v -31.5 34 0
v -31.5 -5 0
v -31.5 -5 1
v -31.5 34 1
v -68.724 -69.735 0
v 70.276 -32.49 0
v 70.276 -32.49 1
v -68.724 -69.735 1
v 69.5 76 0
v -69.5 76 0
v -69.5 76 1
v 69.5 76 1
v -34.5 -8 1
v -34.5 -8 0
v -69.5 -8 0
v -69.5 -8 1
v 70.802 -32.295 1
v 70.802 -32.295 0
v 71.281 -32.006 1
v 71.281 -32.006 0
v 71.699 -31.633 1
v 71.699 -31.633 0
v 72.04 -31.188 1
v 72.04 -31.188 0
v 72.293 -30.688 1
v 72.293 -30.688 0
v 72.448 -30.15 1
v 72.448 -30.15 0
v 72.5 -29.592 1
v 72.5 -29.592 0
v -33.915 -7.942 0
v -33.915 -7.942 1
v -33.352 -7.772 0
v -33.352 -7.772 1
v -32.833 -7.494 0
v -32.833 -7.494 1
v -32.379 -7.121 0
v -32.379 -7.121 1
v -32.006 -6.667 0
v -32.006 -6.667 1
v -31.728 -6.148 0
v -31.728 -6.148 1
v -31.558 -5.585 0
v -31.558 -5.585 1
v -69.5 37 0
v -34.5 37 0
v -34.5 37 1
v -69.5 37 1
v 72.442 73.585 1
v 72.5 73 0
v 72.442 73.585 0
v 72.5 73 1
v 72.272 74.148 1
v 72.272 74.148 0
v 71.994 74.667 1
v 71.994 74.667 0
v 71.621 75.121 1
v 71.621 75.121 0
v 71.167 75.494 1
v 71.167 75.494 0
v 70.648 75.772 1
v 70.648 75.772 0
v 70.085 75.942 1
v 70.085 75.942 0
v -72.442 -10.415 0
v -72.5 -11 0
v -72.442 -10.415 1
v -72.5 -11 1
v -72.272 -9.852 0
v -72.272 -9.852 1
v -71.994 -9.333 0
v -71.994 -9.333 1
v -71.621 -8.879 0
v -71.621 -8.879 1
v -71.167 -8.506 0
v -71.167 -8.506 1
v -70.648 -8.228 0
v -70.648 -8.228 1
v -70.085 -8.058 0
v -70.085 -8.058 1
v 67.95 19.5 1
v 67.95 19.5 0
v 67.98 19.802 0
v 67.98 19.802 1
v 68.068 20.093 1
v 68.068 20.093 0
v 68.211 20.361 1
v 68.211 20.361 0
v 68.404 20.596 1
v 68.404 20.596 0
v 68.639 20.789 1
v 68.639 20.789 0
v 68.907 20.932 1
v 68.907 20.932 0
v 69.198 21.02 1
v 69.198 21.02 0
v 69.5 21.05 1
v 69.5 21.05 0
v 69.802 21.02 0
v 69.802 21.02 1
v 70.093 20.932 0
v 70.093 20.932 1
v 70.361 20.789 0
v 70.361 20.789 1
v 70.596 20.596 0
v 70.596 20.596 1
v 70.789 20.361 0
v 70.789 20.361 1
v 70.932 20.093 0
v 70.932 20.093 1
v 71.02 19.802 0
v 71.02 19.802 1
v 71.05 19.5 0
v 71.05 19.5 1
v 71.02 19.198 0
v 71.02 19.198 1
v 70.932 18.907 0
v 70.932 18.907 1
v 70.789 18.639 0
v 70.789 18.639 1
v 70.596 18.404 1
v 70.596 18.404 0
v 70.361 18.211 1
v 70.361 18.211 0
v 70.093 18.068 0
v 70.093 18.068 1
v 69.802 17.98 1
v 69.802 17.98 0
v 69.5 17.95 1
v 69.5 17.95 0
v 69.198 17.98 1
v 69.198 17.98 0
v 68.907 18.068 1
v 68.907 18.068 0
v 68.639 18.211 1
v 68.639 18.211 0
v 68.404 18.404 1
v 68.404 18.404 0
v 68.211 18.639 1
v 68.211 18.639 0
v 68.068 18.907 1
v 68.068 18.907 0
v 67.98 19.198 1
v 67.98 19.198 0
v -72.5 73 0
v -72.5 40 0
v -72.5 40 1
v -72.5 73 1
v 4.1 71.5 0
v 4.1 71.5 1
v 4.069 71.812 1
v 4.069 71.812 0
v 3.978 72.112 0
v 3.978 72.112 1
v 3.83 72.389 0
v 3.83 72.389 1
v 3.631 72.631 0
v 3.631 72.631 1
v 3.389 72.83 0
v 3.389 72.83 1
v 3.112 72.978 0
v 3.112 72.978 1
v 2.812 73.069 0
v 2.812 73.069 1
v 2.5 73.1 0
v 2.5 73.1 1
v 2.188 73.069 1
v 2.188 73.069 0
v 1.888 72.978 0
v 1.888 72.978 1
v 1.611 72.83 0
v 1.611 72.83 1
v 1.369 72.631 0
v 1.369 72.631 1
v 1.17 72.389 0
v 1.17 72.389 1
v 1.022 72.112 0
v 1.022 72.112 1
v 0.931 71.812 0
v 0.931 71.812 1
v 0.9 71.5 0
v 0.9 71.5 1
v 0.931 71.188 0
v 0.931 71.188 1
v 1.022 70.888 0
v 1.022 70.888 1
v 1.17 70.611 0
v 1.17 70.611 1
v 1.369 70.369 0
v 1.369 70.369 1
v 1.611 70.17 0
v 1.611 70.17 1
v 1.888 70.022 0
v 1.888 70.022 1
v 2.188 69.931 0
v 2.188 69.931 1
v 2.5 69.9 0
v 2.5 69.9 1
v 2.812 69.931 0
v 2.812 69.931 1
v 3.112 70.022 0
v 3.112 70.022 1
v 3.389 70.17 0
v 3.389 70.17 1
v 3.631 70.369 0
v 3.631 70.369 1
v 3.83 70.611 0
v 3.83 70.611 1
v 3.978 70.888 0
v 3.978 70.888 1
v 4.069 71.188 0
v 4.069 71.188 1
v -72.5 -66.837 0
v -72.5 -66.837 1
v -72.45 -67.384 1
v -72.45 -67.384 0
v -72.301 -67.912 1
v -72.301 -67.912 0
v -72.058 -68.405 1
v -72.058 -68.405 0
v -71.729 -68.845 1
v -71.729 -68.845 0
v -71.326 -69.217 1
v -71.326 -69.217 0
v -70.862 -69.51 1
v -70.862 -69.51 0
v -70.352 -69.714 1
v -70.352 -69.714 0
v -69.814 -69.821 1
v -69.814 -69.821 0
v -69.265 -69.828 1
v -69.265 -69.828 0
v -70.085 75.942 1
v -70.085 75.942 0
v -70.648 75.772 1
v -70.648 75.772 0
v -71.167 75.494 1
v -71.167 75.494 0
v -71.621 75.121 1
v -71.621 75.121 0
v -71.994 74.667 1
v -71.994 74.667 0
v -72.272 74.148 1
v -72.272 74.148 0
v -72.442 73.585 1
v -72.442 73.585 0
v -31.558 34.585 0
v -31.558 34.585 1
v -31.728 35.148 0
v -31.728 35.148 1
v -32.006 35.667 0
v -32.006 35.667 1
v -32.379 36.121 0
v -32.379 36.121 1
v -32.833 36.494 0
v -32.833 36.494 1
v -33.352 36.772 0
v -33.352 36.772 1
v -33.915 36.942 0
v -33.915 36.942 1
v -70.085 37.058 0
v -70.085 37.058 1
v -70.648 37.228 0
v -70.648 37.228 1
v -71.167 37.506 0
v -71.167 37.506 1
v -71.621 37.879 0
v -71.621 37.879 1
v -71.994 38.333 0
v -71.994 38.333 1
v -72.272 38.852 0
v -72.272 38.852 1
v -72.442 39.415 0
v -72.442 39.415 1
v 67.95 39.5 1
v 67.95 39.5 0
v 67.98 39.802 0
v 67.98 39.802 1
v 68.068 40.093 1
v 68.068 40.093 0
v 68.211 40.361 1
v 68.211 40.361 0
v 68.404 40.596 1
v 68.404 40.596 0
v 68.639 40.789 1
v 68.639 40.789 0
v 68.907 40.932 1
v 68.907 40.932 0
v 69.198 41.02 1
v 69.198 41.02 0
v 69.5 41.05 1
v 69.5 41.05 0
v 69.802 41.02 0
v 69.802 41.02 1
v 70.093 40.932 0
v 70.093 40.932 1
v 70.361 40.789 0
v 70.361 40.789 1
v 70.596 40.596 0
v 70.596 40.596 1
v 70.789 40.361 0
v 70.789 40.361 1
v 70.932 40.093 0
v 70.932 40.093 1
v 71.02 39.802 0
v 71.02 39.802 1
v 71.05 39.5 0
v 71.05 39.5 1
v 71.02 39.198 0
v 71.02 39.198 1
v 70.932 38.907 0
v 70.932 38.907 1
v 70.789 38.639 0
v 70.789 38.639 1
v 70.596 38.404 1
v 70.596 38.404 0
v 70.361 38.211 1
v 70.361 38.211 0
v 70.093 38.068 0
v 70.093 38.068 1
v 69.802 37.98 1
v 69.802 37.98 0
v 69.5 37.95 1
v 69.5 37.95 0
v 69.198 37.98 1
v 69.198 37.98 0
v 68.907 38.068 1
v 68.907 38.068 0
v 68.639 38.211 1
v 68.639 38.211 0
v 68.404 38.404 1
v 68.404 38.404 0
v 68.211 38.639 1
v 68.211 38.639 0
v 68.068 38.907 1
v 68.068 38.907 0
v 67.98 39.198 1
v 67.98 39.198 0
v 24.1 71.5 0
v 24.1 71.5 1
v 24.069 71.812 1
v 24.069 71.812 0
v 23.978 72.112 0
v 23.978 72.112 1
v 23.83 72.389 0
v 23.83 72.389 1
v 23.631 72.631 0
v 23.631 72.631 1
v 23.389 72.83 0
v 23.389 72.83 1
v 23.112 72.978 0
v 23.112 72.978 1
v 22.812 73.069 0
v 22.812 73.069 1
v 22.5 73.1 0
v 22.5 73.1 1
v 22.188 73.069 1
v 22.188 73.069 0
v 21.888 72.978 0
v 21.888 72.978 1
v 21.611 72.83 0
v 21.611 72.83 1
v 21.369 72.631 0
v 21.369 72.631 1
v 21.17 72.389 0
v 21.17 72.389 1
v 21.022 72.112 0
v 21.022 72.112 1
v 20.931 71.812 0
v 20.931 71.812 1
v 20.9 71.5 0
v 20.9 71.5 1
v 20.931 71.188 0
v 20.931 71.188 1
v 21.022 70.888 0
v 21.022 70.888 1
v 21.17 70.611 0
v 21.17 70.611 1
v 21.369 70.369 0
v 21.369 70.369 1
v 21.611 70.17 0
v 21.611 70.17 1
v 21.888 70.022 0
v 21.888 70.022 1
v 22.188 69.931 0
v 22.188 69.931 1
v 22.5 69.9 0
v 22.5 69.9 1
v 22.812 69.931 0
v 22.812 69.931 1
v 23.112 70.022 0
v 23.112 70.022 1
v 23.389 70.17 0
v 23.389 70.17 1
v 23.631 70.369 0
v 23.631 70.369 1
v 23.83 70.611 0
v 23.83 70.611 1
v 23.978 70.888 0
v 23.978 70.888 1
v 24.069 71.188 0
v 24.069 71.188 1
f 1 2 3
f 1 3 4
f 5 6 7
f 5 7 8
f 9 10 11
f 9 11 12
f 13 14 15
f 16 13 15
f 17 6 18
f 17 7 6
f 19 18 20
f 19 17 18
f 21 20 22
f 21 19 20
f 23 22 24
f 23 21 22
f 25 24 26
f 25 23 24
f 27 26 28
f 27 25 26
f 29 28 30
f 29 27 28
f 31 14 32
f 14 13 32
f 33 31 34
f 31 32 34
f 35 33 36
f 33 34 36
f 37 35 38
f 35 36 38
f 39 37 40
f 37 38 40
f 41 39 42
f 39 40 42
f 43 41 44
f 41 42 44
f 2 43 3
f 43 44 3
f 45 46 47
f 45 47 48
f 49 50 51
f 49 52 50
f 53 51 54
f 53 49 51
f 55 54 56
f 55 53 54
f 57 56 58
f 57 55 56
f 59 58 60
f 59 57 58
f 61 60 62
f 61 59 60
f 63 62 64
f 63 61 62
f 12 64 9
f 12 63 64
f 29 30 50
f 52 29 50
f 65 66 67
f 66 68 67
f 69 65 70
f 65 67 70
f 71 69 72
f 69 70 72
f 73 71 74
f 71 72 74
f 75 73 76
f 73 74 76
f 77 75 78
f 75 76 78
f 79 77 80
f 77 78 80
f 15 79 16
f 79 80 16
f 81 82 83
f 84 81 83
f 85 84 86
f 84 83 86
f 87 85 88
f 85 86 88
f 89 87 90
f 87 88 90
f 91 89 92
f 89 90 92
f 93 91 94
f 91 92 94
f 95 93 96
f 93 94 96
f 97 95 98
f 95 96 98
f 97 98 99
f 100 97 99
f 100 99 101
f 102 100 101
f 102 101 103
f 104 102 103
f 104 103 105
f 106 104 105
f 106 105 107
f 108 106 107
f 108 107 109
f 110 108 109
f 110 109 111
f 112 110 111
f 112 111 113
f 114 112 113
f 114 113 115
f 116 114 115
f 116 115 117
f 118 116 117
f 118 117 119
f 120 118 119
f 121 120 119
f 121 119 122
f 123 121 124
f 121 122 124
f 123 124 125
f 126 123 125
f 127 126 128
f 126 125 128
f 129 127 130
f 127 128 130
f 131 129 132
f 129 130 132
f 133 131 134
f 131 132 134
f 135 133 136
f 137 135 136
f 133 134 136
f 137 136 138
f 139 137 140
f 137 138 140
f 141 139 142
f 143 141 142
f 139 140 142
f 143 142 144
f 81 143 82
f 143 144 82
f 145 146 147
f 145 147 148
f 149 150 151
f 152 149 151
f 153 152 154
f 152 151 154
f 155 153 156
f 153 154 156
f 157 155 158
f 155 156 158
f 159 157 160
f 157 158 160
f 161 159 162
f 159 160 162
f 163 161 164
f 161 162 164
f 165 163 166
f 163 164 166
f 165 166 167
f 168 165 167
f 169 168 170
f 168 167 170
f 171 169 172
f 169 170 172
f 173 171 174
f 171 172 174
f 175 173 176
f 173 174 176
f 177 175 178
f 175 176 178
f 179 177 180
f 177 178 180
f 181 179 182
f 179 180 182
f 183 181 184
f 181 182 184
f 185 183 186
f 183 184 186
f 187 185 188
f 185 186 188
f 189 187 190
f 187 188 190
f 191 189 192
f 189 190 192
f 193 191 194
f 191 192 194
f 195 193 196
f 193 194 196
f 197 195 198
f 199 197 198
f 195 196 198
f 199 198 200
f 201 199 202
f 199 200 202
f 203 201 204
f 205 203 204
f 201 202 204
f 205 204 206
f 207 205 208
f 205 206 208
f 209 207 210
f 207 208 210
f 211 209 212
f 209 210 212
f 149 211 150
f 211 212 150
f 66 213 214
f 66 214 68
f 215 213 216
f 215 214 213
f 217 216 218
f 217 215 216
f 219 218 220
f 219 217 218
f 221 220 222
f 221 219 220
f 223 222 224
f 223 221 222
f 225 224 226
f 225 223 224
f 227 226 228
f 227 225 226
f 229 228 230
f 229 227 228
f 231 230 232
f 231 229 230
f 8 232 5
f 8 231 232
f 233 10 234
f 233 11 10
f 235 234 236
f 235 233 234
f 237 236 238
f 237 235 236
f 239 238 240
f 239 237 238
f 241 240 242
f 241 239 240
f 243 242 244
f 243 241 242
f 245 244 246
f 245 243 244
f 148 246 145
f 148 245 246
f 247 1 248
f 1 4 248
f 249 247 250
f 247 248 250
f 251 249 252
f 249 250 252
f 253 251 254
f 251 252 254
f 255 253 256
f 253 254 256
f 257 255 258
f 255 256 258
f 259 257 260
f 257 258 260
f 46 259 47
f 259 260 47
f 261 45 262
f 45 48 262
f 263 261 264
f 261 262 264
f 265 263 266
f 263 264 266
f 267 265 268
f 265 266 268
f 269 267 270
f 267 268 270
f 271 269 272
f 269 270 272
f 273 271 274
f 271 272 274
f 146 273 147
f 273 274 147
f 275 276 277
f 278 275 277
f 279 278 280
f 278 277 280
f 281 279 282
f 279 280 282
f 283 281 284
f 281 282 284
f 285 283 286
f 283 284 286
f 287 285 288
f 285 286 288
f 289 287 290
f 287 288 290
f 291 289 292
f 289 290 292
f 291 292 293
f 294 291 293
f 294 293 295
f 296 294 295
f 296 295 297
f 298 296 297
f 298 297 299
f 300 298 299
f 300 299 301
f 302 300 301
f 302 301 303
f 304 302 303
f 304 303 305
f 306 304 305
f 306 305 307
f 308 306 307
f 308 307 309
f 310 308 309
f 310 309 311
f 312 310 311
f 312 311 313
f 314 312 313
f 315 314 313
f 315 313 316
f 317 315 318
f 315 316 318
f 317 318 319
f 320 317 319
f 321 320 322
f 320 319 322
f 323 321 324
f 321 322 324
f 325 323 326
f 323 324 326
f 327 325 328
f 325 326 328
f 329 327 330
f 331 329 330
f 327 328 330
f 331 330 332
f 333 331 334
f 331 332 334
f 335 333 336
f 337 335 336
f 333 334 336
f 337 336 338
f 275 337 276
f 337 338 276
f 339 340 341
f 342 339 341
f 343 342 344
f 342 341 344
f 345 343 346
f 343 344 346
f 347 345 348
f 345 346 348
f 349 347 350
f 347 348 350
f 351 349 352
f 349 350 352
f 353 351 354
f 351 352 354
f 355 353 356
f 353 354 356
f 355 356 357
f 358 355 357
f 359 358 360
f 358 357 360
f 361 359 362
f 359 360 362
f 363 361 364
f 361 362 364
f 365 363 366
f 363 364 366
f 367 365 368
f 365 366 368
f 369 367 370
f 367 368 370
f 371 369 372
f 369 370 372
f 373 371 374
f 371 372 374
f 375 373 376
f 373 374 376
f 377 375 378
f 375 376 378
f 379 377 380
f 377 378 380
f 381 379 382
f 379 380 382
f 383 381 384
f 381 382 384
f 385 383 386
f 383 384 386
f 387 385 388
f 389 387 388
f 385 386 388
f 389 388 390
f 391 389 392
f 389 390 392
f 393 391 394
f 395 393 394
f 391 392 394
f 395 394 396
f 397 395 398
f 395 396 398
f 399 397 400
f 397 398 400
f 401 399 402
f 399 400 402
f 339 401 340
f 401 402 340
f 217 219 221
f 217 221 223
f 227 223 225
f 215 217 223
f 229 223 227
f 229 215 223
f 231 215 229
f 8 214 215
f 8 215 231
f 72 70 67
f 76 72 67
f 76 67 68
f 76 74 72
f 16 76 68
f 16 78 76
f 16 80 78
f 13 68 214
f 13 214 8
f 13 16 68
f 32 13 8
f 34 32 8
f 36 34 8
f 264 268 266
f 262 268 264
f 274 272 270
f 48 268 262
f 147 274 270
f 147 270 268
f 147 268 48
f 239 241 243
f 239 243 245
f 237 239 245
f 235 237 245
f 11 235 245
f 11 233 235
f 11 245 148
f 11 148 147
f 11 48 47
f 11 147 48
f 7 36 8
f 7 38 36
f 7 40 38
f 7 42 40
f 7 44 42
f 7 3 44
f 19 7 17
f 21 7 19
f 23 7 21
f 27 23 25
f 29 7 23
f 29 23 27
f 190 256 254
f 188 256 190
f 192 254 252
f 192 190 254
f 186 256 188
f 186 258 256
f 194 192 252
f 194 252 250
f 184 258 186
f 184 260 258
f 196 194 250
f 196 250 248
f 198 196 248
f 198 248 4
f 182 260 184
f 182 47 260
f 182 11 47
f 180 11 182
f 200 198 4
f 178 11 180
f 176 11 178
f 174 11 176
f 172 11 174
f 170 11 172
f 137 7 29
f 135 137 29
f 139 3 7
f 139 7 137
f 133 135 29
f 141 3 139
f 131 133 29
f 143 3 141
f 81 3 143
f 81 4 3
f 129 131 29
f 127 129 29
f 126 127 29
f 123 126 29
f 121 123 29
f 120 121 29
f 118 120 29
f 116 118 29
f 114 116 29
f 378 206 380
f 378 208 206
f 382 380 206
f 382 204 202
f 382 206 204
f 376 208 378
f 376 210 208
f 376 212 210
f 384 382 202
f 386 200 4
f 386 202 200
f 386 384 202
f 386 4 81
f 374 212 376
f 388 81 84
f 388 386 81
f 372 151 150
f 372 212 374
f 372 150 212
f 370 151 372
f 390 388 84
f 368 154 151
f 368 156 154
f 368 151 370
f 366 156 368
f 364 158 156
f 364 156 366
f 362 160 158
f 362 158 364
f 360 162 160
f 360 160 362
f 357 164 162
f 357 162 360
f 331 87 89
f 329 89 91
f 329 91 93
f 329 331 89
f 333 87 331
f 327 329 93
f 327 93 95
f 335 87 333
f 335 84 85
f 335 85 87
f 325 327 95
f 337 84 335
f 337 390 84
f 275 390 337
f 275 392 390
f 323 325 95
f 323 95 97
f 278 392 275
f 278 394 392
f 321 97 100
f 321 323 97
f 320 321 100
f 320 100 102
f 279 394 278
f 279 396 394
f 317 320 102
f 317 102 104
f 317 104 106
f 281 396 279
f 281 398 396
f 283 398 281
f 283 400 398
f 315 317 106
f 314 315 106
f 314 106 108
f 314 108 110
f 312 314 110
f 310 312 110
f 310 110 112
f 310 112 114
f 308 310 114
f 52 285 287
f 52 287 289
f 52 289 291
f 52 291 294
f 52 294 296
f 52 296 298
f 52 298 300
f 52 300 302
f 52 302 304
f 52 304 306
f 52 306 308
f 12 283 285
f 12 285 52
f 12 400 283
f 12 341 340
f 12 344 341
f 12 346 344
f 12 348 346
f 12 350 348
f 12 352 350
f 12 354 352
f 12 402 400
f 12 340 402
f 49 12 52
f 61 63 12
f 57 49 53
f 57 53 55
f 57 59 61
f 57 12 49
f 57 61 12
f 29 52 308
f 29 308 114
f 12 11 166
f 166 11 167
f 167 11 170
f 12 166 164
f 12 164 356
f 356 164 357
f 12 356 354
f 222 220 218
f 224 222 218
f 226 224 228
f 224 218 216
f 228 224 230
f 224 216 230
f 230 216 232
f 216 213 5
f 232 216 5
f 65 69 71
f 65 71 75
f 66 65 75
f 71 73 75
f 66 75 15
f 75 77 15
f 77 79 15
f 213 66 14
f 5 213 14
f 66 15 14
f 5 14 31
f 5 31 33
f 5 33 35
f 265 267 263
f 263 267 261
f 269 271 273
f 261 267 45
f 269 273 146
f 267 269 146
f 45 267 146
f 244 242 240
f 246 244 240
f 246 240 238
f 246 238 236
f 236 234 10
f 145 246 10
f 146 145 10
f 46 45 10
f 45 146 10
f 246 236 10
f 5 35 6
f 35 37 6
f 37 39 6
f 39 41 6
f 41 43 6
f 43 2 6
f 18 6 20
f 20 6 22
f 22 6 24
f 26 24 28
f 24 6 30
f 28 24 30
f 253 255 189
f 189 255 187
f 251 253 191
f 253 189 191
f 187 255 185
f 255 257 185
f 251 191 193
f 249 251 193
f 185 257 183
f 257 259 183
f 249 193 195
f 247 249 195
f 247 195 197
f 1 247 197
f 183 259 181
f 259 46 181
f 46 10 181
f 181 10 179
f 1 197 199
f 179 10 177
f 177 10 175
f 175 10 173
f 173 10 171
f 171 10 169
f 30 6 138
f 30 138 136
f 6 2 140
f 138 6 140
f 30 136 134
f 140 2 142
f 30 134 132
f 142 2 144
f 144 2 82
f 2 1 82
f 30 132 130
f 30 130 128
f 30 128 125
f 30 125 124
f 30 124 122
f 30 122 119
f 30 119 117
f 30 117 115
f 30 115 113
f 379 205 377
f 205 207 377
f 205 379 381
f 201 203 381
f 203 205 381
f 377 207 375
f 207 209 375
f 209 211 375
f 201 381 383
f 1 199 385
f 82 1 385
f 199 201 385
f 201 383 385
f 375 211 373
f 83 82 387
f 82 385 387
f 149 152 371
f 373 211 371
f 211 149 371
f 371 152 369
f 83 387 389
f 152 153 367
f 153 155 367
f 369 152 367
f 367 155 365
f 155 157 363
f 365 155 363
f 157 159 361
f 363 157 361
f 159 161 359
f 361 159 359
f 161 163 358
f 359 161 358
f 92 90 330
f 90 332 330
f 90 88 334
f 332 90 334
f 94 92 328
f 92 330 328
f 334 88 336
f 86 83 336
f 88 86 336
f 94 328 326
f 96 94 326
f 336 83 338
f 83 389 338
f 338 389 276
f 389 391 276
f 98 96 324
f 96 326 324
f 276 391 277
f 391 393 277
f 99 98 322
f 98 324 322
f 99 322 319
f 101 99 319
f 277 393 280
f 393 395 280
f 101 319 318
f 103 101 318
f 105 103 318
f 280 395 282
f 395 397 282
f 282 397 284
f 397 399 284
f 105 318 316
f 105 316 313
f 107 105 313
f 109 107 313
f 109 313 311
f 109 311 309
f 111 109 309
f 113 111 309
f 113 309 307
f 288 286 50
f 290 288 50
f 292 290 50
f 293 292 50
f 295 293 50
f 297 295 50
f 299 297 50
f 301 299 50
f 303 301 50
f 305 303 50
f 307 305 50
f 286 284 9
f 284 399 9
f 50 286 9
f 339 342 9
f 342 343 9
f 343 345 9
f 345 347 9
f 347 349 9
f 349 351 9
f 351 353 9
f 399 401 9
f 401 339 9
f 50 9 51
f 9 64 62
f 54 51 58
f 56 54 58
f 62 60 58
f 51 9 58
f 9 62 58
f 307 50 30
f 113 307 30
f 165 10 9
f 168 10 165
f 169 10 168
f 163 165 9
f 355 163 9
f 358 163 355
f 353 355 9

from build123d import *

# Parameters (mm, degrees)
SKETCH_1_W          = 145
SKETCH_1_H          = 152
EXTRUDE_1_DEPTH     = 1
SKETCH_2_W          = 41
SKETCH_2_H          = 45
CUT_EXTRUDE_1_DEPTH = 1
SKETCH_3_R          = 1.6
CUT_EXTRUDE_2_DEPTH = 1
FILLET_1_R          = 3
SKETCH_7_R          = 1.55
CUT_EXTRUDE_6_DEPTH = 10


with BuildPart() as part:
    # 草图1 → 凸台-拉伸1 (new body)
    with BuildSketch(Plane.XY):
        Rectangle(SKETCH_1_W, SKETCH_1_H)
    extrude(amount=EXTRUDE_1_DEPTH)

    # 草图2 → 切除-拉伸1 (cut)
    with BuildSketch(Plane(origin=(0, 0, 0), x_dir=(-1, 0, 0), z_dir=(0, 0, -1))):
        with Locations((52, 14.5)):
            Rectangle(SKETCH_2_W, SKETCH_2_H)
        Polygon((-72.5, -31.894171459), (72.5, -70.746804361), (72.5, -76), (-72.5, -76), align=None)
    extrude(amount=-CUT_EXTRUDE_1_DEPTH, mode=Mode.SUBTRACT)

    # 草图3 → 切除-拉伸2 (cut)
    with BuildSketch(Plane.XY.offset(1)):
        with Locations((2.5, 71.5)):
            Circle(SKETCH_3_R)
        with Locations((22.5, 71.5)):
            Circle(SKETCH_3_R)
    extrude(amount=-CUT_EXTRUDE_2_DEPTH, mode=Mode.SUBTRACT)

    # 圆角1
    fillet_1_edges = [part.edges().sort_by_distance(p)[0] for p in [
        (72.5, -31.894171459, 0.5),
        (-72.5, -70.746804361, 0.5),
        (-72.5, -8, 0.5),
        (-31.5, -8, 0.5),
        (-31.5, 37, 0.5),
        (-72.5, 37, 0.5),
        (-72.5, 76, 0.5),
        (72.5, 76, 0.5),
    ]]
    fillet(fillet_1_edges, radius=FILLET_1_R)

    # 草图7 → 切除-拉伸6 (cut)
    with BuildSketch(Plane(origin=(0, 0, 0), x_dir=(-1, 0, 0), z_dir=(0, 0, -1))):
        with Locations((-69.5, 39.5)):
            Circle(SKETCH_7_R)
        with Locations((-69.5, 19.5)):
            Circle(SKETCH_7_R)
    extrude(amount=-CUT_EXTRUDE_6_DEPTH, mode=Mode.SUBTRACT)


solid = part.part
